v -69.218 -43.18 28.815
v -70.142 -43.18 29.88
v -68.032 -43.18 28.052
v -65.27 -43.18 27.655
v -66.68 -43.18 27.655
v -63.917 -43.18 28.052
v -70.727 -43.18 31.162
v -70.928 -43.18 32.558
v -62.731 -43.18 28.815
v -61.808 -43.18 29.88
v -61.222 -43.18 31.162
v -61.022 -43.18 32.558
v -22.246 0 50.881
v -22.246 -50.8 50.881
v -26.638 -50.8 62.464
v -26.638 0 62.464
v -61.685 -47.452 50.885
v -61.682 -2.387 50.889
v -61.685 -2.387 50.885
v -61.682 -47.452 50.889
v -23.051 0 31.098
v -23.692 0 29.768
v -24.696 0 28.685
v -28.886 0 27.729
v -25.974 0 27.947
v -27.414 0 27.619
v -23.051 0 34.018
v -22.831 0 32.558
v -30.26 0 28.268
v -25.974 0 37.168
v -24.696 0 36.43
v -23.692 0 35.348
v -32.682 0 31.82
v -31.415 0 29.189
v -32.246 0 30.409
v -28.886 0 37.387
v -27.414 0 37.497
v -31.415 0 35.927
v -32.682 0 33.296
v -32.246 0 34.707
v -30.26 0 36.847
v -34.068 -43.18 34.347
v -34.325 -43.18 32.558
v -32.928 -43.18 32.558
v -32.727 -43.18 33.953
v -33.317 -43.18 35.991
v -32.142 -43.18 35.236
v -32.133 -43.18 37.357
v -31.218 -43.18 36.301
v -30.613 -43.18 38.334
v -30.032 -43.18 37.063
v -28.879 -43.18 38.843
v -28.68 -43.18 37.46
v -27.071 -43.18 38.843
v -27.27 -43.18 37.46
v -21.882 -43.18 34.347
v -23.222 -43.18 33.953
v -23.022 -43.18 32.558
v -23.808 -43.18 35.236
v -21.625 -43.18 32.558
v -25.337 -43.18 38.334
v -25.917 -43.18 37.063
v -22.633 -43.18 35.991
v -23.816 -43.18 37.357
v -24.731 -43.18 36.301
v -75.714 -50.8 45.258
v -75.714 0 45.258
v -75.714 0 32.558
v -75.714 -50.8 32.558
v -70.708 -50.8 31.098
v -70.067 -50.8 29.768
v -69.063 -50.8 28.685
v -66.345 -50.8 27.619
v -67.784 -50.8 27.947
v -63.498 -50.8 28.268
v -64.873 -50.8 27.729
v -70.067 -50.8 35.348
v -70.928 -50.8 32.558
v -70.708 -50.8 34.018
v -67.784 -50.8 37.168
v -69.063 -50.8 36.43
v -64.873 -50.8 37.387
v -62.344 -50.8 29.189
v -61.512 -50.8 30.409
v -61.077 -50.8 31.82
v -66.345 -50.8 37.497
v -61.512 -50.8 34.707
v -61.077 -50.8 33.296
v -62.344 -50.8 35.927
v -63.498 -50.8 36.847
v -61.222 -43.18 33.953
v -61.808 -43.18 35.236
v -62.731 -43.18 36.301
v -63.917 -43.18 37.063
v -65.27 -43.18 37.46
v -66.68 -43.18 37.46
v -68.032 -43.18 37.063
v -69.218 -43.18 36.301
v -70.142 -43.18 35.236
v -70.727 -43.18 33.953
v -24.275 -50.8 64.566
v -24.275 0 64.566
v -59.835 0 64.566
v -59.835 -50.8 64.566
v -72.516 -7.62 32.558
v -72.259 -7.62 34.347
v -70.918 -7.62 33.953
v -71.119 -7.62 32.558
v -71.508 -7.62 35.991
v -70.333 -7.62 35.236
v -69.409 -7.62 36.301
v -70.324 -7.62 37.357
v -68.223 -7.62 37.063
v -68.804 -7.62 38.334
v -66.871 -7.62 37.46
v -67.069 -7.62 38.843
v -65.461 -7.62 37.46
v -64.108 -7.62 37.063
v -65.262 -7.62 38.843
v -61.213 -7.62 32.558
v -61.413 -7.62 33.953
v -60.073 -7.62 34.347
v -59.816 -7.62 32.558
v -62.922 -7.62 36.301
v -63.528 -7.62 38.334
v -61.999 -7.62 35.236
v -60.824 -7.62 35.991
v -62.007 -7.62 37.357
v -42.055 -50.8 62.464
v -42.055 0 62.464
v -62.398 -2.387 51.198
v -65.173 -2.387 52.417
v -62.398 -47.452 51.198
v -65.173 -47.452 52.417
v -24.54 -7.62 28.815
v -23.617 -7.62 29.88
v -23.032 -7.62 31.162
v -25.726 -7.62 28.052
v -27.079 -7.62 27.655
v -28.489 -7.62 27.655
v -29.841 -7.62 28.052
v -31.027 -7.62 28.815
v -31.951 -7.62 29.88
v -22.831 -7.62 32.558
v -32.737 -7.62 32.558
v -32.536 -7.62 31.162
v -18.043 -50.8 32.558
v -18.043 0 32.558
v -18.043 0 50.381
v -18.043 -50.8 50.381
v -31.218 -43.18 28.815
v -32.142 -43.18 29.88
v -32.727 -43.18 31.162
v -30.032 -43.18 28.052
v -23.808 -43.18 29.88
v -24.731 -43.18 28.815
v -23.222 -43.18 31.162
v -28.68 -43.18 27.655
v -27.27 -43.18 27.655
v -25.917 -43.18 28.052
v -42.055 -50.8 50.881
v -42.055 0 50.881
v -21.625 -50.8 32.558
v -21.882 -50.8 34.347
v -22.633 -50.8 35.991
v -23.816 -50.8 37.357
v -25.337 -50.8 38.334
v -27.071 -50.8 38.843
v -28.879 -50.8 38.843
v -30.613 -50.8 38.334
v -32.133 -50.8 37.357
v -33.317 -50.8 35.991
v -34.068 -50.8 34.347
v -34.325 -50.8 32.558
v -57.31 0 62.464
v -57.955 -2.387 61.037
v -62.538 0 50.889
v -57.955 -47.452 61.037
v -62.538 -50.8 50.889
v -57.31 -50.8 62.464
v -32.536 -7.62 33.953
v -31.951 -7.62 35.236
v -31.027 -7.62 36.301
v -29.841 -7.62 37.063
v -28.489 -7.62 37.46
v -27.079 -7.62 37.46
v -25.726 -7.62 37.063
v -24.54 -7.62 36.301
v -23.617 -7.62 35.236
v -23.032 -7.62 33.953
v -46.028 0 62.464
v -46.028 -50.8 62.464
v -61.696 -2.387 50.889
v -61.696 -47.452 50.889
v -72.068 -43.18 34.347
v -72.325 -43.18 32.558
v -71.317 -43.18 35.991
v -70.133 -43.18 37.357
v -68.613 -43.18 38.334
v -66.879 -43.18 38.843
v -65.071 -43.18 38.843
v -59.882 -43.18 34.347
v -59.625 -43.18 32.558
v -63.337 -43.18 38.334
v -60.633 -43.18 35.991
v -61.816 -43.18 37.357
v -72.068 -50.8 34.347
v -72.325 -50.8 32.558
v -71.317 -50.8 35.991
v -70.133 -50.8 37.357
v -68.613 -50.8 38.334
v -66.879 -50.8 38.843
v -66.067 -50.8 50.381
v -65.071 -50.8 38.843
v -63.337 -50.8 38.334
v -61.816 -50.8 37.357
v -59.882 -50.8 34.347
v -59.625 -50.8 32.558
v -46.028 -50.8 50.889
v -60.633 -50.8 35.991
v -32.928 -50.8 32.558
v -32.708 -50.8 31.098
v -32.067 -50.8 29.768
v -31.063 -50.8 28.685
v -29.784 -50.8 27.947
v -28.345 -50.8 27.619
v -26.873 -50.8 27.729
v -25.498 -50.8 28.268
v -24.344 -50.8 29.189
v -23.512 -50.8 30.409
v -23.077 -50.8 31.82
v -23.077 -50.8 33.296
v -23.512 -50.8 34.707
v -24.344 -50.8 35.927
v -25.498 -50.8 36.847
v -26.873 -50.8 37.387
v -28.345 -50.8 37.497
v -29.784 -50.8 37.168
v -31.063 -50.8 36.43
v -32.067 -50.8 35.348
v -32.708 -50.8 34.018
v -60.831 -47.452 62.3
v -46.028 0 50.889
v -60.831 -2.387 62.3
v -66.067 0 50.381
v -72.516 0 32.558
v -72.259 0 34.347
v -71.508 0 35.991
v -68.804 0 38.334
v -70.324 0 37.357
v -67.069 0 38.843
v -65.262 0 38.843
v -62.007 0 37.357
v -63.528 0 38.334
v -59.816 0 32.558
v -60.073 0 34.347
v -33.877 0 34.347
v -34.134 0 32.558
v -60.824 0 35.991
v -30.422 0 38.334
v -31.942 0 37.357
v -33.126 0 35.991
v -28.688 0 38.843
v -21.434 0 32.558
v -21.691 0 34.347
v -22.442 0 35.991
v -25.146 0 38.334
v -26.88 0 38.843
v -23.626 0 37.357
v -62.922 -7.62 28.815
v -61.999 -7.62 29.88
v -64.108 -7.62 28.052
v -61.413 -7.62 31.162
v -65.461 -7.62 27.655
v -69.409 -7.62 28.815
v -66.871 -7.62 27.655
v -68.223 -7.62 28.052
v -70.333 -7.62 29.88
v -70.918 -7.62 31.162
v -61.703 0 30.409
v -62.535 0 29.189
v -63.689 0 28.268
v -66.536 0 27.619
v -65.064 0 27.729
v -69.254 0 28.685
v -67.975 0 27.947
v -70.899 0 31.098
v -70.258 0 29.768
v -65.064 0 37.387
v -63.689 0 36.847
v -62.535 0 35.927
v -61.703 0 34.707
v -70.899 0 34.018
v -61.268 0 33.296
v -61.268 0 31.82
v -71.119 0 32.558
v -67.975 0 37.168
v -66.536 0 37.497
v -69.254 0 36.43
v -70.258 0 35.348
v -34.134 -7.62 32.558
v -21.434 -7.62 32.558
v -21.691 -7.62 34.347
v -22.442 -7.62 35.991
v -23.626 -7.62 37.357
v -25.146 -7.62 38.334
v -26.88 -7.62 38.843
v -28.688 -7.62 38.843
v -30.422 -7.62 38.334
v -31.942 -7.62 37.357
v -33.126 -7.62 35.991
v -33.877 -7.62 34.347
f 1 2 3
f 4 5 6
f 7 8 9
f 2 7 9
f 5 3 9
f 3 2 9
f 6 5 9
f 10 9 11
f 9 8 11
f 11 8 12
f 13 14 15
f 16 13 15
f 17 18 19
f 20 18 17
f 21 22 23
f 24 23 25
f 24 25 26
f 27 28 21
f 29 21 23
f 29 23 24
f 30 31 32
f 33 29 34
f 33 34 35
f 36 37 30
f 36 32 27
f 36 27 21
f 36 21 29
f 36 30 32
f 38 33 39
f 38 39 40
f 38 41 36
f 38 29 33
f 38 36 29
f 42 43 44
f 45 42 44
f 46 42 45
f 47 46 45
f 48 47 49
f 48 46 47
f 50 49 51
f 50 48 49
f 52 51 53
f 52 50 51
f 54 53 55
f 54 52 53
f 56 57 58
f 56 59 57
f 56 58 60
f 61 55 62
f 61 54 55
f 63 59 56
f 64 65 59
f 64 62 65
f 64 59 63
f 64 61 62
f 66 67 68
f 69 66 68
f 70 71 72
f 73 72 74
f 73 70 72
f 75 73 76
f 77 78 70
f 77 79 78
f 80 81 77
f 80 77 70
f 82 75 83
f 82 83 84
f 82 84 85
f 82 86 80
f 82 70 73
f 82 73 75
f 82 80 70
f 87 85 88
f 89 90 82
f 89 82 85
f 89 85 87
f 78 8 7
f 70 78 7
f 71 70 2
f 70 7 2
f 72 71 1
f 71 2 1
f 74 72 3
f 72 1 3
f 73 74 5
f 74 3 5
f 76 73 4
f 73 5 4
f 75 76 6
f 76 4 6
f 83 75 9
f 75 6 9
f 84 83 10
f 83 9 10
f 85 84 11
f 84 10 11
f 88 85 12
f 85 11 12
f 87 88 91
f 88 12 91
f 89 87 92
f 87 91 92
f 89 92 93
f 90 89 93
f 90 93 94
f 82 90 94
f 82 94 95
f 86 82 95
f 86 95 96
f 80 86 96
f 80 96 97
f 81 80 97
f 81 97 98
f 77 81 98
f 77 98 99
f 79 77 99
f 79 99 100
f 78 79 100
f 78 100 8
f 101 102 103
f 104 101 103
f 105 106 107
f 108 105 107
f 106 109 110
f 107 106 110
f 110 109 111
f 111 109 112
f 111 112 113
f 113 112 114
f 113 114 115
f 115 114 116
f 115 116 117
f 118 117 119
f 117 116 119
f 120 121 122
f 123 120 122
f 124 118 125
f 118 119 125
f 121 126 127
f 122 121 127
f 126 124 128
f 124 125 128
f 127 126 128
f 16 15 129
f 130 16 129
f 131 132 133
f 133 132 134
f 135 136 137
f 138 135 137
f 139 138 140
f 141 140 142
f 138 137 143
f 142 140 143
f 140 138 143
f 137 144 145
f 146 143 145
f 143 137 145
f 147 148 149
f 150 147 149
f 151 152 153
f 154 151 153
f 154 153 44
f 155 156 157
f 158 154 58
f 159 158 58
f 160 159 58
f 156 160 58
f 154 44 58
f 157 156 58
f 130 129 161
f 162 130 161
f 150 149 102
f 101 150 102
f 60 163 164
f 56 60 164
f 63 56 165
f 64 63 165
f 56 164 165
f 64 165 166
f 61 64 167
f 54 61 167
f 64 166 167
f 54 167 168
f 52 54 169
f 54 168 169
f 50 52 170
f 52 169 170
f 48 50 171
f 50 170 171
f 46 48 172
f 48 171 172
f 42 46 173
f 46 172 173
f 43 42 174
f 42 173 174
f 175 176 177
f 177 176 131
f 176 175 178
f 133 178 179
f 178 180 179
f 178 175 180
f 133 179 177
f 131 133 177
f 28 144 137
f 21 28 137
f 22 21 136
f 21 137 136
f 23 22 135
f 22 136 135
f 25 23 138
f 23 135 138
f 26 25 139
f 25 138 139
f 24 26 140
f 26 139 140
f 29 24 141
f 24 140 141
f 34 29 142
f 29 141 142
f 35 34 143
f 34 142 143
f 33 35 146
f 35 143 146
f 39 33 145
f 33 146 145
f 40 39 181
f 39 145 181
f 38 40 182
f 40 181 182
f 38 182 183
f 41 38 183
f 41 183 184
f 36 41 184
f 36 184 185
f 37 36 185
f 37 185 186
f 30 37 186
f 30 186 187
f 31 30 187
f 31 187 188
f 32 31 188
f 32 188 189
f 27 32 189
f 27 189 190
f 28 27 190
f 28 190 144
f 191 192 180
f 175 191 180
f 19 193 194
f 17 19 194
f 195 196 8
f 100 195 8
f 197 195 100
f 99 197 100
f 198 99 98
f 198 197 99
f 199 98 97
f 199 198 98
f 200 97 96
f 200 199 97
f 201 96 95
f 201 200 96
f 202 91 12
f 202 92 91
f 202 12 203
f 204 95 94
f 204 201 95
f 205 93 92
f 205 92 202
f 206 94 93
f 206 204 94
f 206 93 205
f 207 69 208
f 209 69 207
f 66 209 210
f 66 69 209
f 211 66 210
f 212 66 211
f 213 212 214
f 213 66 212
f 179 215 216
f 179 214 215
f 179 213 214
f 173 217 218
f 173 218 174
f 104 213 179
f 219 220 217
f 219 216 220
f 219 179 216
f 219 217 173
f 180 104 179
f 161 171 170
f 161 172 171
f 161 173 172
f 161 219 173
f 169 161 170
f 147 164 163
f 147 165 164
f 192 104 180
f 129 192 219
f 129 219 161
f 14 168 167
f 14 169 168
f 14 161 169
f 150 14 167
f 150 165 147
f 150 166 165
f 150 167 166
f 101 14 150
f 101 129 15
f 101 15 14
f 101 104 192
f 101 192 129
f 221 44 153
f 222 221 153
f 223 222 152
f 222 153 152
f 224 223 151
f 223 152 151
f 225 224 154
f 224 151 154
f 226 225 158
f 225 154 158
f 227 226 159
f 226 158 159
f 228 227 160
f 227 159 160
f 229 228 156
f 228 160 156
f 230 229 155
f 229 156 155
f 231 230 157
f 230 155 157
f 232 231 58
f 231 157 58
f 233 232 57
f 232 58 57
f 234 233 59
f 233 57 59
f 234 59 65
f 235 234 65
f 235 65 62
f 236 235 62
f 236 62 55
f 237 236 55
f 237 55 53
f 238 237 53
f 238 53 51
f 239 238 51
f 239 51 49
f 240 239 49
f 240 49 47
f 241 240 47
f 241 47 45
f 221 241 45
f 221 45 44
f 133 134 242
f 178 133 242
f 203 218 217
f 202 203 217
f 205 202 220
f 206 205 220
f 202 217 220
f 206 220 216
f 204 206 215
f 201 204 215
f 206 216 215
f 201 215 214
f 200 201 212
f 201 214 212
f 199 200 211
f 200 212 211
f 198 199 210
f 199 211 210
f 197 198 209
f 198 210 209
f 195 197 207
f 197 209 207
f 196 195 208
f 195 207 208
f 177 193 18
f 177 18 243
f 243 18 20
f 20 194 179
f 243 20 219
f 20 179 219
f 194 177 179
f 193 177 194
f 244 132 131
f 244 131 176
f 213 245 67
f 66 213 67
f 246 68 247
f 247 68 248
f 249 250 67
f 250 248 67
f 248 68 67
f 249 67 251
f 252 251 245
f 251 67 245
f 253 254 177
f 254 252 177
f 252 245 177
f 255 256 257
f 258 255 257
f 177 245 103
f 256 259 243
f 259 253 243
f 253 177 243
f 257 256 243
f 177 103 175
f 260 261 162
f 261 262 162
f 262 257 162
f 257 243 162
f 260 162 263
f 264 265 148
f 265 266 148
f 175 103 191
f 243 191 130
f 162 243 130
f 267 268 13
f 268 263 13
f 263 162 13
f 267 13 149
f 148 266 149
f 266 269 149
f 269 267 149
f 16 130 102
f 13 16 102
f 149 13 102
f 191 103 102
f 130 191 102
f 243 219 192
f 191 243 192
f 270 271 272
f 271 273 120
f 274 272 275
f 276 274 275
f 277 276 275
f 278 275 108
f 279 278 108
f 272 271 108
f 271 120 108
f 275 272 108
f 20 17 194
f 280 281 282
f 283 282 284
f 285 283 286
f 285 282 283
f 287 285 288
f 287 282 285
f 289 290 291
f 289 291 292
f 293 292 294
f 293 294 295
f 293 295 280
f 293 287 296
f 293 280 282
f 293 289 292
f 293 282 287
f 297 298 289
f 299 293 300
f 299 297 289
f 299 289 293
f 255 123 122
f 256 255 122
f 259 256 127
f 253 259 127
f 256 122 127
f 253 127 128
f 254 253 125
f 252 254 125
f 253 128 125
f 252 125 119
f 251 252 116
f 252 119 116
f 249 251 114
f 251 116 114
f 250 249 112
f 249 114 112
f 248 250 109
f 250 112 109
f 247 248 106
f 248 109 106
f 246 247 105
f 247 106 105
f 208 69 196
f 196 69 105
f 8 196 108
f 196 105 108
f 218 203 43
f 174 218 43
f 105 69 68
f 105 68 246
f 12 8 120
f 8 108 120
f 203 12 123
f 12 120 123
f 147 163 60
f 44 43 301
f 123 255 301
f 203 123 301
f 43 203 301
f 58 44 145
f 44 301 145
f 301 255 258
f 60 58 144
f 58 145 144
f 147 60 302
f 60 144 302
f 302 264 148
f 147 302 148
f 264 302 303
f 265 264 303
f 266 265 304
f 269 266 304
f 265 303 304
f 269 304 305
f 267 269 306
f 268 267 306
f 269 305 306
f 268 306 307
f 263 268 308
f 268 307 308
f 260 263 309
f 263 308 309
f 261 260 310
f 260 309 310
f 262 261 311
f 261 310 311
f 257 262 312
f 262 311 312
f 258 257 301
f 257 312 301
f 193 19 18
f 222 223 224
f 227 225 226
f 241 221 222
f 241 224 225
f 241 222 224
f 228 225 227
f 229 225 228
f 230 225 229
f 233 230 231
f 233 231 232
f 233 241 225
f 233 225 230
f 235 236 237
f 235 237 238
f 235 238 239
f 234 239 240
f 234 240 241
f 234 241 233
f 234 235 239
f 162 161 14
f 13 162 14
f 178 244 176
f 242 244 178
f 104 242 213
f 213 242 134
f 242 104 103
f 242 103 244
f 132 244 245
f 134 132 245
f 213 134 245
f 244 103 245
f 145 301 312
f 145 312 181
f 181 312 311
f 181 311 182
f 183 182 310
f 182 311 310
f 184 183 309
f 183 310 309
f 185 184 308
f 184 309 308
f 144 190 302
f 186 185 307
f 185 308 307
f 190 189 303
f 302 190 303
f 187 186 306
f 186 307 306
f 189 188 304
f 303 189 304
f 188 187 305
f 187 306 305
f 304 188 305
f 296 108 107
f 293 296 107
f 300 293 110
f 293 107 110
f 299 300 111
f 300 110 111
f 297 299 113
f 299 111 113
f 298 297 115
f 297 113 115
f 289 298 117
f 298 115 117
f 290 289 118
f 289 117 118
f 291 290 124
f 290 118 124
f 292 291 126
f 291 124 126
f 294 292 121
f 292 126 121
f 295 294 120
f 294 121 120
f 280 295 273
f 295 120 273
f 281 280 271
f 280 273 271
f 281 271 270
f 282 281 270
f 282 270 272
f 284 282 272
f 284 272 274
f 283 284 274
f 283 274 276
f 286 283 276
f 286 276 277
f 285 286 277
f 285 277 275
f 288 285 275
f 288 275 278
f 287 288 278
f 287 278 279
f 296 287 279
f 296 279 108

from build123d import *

# Parameters (mm, degrees)
F1_DEPTH         = 50.8
F3_DEPTH         = 7.62
F3_COPIES_COUNT  = 2
F3_COPIES_PITCH  = 43.180422
F3_COPIES1_COUNT = 2
F3_COPIES1_PITCH = 57.645984
F5_DEPTH         = 7.62
F7_DEPTH         = 7.62
F9_DEPTH         = 7.62
F11_DEPTH        = 76.2
F13_DEPTH        = 76.2
F14_W            = 45.0653012376
F14_H            = 10.795
F15_DEPTH        = 3.81
F17_DEPTH        = 7.62
F19_DEPTH        = 7.62
F21_DEPTH        = 7.62
F23_DEPTH        = 7.62


# Not quite as in the source:
# - a pattern or mirror of a feature is missing from the dataset's text; its kind, count and spacing are read off the source's solid


with BuildPart() as f1:
    # F0 (on Front) → F1 (new body)
    with BuildSketch(Plane.XZ):
        Polygon((-75.7135227323, 45.2577668846), (-75.7135227323, 32.5577668846), (-18.04306696, 32.5577668846), (-18.04306696, 34.4673171639), (-18.04306696, 50.3806362459), (-24.2752695117, 64.5659697758), (-59.8352695117, 64.5659697758), (-66.0674720634, 50.3806362459), align=None)
    extrude(amount=F1_DEPTH)

    # F2 (on face) → F3 (cut)
    with BuildSketch(Plane.XZ.offset(50.8)):
        with BuildLine():
            Line((-72.3248315811, 32.5577668846), (-59.6248315811, 32.5577668846))
            ThreePointArc((-59.6248315811, 32.5577668846), (-65.9748315811, 38.9077668846), (-72.3248315811, 32.5577668846))
        make_face()
    f3 = extrude(amount=-F3_DEPTH, mode=Mode.SUBTRACT)

    # F3_copies: F3 ×2
    with Locations(*[Vector(-0.004422337, 0.9999902214, 0) * (i * F3_COPIES_PITCH) for i in range(1, F3_COPIES_COUNT)]):
        add(f3, mode=Mode.SUBTRACT)

    # F3_copies1: F3 ×2
    with Locations(*[Vector(0.662508063, 0.749054782, 0) * (i * F3_COPIES1_PITCH) for i in range(1, F3_COPIES1_COUNT)]):
        add(f3, mode=Mode.SUBTRACT)

    # F4 (on face) → F5 (join)
    with BuildSketch(Plane.XZ.offset(43.18)):
        with BuildLine():
            Line((-70.9278315811, 32.5577668846), (-61.0218315811, 32.5577668846))
            ThreePointArc((-61.0218315811, 32.5577668846), (-65.9748315811, 37.5107668846), (-70.9278315811, 32.5577668846))
        make_face()
        with BuildLine():
            ThreePointArc((-70.9278315811, 32.5577668846), (-65.9748315811, 27.6047668846), (-61.0218315811, 32.5577668846))
            Line((-61.0218315811, 32.5577668846), (-70.9278315811, 32.5577668846))
        make_face()
    extrude(amount=F5_DEPTH)

    # F6 (on face) → F7 (cut)
    with BuildSketch(Plane.XZ.offset(50.8)):
        with BuildLine():
            Line((-34.3248570174, 32.5577668846), (-21.6248570174, 32.5577668846))
            ThreePointArc((-21.6248570174, 32.5577668846), (-27.9748570174, 38.9077668846), (-34.3248570174, 32.5577668846))
        make_face()
    extrude(amount=-F7_DEPTH, mode=Mode.SUBTRACT)

    # F8 (on face) → F9 (join)
    with BuildSketch(Plane.XZ.offset(43.18)):
        with BuildLine():
            Line((-32.9278570174, 32.5577668846), (-23.0218570174, 32.5577668846))
            ThreePointArc((-23.0218570174, 32.5577668846), (-27.9748570174, 37.5107668846), (-32.9278570174, 32.5577668846))
        make_face()
        with BuildLine():
            ThreePointArc((-32.9278570174, 32.5577668846), (-27.9748570174, 27.6047668846), (-23.0218570174, 32.5577668846))
            Line((-23.0218570174, 32.5577668846), (-32.9278570174, 32.5577668846))
        make_face()
    extrude(amount=F9_DEPTH)

    # F10 (on face) → F11 (cut)
    with BuildSketch(Plane.XZ.offset(50.8)):
        Polygon((-46.0276552343, 62.4638214125), (-57.3104978095, 62.4638214125), (-62.5376552343, 50.8894175291), (-46.0276552343, 50.8894175291), align=None)
    extrude(amount=-F11_DEPTH, mode=Mode.SUBTRACT)

    # F12 (on face) → F13 (cut)
    with BuildSketch(Plane.XZ.offset(50.8)):
        Polygon((-26.6381744295, 62.4638214125), (-42.0552695117, 62.4638214125), (-42.0552695117, 50.8814214125), (-22.2462173551, 50.8814214125), align=None)
    extrude(amount=-F13_DEPTH, mode=Mode.SUBTRACT)

    # F14 (on face) → F15 (cut)
    with BuildSketch(Plane(origin=(-73.9314589089, 0, 32.4811415881), x_dir=(0, -1, 0), z_dir=(-0.9155372099, 0, 0.4022332872))):
        with Locations((24.9195831129, 27.1725985175)):
            Rectangle(F14_W, F14_H)
    extrude(amount=-F15_DEPTH, mode=Mode.SUBTRACT)

    # F16 (on face) → F17 (cut)
    with BuildSketch(Plane(origin=(0, 0, 0), x_dir=(-1, 0, 0), z_dir=(0, 1, 0))):
        with BuildLine():
            ThreePointArc((21.433902362, 32.5577668846), (27.783902362, 26.2077668846), (34.133902362, 32.5577668846))
            ThreePointArc((34.133902362, 32.5577668846), (27.783902362, 38.9077668846), (21.433902362, 32.5577668846))
        make_face()
    extrude(amount=-F17_DEPTH, mode=Mode.SUBTRACT)

    # F18 (on face) → F19 (join)
    with BuildSketch(Plane(origin=(0, -7.62, 0), x_dir=(-1, 0, 0), z_dir=(0, 1, 0))):
        with BuildLine():
            Line((22.830902362, 32.5577668846), (32.736902362, 32.5577668846))
            ThreePointArc((32.736902362, 32.5577668846), (27.783902362, 37.5107668846), (22.830902362, 32.5577668846))
        make_face()
        with BuildLine():
            ThreePointArc((22.830902362, 32.5577668846), (27.783902362, 27.6047668846), (32.736902362, 32.5577668846))
            Line((32.736902362, 32.5577668846), (22.830902362, 32.5577668846))
        make_face()
    extrude(amount=F19_DEPTH)

    # F20 (on face) → F21 (cut)
    with BuildSketch(Plane(origin=(0, 0, 0), x_dir=(-1, 0, 0), z_dir=(0, 1, 0))):
        with BuildLine():
            ThreePointArc((59.8157899618, 32.5577668846), (66.1657899618, 26.2077668846), (72.5157899618, 32.5577668846))
            ThreePointArc((72.5157899618, 32.5577668846), (66.1657899618, 38.9077668846), (59.8157899618, 32.5577668846))
        make_face()
    extrude(amount=-F21_DEPTH, mode=Mode.SUBTRACT)

    # F22 (on face) → F23 (join)
    with BuildSketch(Plane(origin=(0, -7.62, 0), x_dir=(-1, 0, 0), z_dir=(0, 1, 0))):
        with BuildLine():
            ThreePointArc((61.2127899618, 32.5577668846), (66.1657899618, 27.6047668846), (71.1187899618, 32.5577668846))
            Line((71.1187899618, 32.5577668846), (61.2127899618, 32.5577668846))
        make_face()
        with BuildLine():
            Line((61.2127899618, 32.5577668846), (71.1187899618, 32.5577668846))
            ThreePointArc((71.1187899618, 32.5577668846), (66.1657899618, 37.5107668846), (61.2127899618, 32.5577668846))
        make_face()
    extrude(amount=F23_DEPTH)


solid = f1.part
